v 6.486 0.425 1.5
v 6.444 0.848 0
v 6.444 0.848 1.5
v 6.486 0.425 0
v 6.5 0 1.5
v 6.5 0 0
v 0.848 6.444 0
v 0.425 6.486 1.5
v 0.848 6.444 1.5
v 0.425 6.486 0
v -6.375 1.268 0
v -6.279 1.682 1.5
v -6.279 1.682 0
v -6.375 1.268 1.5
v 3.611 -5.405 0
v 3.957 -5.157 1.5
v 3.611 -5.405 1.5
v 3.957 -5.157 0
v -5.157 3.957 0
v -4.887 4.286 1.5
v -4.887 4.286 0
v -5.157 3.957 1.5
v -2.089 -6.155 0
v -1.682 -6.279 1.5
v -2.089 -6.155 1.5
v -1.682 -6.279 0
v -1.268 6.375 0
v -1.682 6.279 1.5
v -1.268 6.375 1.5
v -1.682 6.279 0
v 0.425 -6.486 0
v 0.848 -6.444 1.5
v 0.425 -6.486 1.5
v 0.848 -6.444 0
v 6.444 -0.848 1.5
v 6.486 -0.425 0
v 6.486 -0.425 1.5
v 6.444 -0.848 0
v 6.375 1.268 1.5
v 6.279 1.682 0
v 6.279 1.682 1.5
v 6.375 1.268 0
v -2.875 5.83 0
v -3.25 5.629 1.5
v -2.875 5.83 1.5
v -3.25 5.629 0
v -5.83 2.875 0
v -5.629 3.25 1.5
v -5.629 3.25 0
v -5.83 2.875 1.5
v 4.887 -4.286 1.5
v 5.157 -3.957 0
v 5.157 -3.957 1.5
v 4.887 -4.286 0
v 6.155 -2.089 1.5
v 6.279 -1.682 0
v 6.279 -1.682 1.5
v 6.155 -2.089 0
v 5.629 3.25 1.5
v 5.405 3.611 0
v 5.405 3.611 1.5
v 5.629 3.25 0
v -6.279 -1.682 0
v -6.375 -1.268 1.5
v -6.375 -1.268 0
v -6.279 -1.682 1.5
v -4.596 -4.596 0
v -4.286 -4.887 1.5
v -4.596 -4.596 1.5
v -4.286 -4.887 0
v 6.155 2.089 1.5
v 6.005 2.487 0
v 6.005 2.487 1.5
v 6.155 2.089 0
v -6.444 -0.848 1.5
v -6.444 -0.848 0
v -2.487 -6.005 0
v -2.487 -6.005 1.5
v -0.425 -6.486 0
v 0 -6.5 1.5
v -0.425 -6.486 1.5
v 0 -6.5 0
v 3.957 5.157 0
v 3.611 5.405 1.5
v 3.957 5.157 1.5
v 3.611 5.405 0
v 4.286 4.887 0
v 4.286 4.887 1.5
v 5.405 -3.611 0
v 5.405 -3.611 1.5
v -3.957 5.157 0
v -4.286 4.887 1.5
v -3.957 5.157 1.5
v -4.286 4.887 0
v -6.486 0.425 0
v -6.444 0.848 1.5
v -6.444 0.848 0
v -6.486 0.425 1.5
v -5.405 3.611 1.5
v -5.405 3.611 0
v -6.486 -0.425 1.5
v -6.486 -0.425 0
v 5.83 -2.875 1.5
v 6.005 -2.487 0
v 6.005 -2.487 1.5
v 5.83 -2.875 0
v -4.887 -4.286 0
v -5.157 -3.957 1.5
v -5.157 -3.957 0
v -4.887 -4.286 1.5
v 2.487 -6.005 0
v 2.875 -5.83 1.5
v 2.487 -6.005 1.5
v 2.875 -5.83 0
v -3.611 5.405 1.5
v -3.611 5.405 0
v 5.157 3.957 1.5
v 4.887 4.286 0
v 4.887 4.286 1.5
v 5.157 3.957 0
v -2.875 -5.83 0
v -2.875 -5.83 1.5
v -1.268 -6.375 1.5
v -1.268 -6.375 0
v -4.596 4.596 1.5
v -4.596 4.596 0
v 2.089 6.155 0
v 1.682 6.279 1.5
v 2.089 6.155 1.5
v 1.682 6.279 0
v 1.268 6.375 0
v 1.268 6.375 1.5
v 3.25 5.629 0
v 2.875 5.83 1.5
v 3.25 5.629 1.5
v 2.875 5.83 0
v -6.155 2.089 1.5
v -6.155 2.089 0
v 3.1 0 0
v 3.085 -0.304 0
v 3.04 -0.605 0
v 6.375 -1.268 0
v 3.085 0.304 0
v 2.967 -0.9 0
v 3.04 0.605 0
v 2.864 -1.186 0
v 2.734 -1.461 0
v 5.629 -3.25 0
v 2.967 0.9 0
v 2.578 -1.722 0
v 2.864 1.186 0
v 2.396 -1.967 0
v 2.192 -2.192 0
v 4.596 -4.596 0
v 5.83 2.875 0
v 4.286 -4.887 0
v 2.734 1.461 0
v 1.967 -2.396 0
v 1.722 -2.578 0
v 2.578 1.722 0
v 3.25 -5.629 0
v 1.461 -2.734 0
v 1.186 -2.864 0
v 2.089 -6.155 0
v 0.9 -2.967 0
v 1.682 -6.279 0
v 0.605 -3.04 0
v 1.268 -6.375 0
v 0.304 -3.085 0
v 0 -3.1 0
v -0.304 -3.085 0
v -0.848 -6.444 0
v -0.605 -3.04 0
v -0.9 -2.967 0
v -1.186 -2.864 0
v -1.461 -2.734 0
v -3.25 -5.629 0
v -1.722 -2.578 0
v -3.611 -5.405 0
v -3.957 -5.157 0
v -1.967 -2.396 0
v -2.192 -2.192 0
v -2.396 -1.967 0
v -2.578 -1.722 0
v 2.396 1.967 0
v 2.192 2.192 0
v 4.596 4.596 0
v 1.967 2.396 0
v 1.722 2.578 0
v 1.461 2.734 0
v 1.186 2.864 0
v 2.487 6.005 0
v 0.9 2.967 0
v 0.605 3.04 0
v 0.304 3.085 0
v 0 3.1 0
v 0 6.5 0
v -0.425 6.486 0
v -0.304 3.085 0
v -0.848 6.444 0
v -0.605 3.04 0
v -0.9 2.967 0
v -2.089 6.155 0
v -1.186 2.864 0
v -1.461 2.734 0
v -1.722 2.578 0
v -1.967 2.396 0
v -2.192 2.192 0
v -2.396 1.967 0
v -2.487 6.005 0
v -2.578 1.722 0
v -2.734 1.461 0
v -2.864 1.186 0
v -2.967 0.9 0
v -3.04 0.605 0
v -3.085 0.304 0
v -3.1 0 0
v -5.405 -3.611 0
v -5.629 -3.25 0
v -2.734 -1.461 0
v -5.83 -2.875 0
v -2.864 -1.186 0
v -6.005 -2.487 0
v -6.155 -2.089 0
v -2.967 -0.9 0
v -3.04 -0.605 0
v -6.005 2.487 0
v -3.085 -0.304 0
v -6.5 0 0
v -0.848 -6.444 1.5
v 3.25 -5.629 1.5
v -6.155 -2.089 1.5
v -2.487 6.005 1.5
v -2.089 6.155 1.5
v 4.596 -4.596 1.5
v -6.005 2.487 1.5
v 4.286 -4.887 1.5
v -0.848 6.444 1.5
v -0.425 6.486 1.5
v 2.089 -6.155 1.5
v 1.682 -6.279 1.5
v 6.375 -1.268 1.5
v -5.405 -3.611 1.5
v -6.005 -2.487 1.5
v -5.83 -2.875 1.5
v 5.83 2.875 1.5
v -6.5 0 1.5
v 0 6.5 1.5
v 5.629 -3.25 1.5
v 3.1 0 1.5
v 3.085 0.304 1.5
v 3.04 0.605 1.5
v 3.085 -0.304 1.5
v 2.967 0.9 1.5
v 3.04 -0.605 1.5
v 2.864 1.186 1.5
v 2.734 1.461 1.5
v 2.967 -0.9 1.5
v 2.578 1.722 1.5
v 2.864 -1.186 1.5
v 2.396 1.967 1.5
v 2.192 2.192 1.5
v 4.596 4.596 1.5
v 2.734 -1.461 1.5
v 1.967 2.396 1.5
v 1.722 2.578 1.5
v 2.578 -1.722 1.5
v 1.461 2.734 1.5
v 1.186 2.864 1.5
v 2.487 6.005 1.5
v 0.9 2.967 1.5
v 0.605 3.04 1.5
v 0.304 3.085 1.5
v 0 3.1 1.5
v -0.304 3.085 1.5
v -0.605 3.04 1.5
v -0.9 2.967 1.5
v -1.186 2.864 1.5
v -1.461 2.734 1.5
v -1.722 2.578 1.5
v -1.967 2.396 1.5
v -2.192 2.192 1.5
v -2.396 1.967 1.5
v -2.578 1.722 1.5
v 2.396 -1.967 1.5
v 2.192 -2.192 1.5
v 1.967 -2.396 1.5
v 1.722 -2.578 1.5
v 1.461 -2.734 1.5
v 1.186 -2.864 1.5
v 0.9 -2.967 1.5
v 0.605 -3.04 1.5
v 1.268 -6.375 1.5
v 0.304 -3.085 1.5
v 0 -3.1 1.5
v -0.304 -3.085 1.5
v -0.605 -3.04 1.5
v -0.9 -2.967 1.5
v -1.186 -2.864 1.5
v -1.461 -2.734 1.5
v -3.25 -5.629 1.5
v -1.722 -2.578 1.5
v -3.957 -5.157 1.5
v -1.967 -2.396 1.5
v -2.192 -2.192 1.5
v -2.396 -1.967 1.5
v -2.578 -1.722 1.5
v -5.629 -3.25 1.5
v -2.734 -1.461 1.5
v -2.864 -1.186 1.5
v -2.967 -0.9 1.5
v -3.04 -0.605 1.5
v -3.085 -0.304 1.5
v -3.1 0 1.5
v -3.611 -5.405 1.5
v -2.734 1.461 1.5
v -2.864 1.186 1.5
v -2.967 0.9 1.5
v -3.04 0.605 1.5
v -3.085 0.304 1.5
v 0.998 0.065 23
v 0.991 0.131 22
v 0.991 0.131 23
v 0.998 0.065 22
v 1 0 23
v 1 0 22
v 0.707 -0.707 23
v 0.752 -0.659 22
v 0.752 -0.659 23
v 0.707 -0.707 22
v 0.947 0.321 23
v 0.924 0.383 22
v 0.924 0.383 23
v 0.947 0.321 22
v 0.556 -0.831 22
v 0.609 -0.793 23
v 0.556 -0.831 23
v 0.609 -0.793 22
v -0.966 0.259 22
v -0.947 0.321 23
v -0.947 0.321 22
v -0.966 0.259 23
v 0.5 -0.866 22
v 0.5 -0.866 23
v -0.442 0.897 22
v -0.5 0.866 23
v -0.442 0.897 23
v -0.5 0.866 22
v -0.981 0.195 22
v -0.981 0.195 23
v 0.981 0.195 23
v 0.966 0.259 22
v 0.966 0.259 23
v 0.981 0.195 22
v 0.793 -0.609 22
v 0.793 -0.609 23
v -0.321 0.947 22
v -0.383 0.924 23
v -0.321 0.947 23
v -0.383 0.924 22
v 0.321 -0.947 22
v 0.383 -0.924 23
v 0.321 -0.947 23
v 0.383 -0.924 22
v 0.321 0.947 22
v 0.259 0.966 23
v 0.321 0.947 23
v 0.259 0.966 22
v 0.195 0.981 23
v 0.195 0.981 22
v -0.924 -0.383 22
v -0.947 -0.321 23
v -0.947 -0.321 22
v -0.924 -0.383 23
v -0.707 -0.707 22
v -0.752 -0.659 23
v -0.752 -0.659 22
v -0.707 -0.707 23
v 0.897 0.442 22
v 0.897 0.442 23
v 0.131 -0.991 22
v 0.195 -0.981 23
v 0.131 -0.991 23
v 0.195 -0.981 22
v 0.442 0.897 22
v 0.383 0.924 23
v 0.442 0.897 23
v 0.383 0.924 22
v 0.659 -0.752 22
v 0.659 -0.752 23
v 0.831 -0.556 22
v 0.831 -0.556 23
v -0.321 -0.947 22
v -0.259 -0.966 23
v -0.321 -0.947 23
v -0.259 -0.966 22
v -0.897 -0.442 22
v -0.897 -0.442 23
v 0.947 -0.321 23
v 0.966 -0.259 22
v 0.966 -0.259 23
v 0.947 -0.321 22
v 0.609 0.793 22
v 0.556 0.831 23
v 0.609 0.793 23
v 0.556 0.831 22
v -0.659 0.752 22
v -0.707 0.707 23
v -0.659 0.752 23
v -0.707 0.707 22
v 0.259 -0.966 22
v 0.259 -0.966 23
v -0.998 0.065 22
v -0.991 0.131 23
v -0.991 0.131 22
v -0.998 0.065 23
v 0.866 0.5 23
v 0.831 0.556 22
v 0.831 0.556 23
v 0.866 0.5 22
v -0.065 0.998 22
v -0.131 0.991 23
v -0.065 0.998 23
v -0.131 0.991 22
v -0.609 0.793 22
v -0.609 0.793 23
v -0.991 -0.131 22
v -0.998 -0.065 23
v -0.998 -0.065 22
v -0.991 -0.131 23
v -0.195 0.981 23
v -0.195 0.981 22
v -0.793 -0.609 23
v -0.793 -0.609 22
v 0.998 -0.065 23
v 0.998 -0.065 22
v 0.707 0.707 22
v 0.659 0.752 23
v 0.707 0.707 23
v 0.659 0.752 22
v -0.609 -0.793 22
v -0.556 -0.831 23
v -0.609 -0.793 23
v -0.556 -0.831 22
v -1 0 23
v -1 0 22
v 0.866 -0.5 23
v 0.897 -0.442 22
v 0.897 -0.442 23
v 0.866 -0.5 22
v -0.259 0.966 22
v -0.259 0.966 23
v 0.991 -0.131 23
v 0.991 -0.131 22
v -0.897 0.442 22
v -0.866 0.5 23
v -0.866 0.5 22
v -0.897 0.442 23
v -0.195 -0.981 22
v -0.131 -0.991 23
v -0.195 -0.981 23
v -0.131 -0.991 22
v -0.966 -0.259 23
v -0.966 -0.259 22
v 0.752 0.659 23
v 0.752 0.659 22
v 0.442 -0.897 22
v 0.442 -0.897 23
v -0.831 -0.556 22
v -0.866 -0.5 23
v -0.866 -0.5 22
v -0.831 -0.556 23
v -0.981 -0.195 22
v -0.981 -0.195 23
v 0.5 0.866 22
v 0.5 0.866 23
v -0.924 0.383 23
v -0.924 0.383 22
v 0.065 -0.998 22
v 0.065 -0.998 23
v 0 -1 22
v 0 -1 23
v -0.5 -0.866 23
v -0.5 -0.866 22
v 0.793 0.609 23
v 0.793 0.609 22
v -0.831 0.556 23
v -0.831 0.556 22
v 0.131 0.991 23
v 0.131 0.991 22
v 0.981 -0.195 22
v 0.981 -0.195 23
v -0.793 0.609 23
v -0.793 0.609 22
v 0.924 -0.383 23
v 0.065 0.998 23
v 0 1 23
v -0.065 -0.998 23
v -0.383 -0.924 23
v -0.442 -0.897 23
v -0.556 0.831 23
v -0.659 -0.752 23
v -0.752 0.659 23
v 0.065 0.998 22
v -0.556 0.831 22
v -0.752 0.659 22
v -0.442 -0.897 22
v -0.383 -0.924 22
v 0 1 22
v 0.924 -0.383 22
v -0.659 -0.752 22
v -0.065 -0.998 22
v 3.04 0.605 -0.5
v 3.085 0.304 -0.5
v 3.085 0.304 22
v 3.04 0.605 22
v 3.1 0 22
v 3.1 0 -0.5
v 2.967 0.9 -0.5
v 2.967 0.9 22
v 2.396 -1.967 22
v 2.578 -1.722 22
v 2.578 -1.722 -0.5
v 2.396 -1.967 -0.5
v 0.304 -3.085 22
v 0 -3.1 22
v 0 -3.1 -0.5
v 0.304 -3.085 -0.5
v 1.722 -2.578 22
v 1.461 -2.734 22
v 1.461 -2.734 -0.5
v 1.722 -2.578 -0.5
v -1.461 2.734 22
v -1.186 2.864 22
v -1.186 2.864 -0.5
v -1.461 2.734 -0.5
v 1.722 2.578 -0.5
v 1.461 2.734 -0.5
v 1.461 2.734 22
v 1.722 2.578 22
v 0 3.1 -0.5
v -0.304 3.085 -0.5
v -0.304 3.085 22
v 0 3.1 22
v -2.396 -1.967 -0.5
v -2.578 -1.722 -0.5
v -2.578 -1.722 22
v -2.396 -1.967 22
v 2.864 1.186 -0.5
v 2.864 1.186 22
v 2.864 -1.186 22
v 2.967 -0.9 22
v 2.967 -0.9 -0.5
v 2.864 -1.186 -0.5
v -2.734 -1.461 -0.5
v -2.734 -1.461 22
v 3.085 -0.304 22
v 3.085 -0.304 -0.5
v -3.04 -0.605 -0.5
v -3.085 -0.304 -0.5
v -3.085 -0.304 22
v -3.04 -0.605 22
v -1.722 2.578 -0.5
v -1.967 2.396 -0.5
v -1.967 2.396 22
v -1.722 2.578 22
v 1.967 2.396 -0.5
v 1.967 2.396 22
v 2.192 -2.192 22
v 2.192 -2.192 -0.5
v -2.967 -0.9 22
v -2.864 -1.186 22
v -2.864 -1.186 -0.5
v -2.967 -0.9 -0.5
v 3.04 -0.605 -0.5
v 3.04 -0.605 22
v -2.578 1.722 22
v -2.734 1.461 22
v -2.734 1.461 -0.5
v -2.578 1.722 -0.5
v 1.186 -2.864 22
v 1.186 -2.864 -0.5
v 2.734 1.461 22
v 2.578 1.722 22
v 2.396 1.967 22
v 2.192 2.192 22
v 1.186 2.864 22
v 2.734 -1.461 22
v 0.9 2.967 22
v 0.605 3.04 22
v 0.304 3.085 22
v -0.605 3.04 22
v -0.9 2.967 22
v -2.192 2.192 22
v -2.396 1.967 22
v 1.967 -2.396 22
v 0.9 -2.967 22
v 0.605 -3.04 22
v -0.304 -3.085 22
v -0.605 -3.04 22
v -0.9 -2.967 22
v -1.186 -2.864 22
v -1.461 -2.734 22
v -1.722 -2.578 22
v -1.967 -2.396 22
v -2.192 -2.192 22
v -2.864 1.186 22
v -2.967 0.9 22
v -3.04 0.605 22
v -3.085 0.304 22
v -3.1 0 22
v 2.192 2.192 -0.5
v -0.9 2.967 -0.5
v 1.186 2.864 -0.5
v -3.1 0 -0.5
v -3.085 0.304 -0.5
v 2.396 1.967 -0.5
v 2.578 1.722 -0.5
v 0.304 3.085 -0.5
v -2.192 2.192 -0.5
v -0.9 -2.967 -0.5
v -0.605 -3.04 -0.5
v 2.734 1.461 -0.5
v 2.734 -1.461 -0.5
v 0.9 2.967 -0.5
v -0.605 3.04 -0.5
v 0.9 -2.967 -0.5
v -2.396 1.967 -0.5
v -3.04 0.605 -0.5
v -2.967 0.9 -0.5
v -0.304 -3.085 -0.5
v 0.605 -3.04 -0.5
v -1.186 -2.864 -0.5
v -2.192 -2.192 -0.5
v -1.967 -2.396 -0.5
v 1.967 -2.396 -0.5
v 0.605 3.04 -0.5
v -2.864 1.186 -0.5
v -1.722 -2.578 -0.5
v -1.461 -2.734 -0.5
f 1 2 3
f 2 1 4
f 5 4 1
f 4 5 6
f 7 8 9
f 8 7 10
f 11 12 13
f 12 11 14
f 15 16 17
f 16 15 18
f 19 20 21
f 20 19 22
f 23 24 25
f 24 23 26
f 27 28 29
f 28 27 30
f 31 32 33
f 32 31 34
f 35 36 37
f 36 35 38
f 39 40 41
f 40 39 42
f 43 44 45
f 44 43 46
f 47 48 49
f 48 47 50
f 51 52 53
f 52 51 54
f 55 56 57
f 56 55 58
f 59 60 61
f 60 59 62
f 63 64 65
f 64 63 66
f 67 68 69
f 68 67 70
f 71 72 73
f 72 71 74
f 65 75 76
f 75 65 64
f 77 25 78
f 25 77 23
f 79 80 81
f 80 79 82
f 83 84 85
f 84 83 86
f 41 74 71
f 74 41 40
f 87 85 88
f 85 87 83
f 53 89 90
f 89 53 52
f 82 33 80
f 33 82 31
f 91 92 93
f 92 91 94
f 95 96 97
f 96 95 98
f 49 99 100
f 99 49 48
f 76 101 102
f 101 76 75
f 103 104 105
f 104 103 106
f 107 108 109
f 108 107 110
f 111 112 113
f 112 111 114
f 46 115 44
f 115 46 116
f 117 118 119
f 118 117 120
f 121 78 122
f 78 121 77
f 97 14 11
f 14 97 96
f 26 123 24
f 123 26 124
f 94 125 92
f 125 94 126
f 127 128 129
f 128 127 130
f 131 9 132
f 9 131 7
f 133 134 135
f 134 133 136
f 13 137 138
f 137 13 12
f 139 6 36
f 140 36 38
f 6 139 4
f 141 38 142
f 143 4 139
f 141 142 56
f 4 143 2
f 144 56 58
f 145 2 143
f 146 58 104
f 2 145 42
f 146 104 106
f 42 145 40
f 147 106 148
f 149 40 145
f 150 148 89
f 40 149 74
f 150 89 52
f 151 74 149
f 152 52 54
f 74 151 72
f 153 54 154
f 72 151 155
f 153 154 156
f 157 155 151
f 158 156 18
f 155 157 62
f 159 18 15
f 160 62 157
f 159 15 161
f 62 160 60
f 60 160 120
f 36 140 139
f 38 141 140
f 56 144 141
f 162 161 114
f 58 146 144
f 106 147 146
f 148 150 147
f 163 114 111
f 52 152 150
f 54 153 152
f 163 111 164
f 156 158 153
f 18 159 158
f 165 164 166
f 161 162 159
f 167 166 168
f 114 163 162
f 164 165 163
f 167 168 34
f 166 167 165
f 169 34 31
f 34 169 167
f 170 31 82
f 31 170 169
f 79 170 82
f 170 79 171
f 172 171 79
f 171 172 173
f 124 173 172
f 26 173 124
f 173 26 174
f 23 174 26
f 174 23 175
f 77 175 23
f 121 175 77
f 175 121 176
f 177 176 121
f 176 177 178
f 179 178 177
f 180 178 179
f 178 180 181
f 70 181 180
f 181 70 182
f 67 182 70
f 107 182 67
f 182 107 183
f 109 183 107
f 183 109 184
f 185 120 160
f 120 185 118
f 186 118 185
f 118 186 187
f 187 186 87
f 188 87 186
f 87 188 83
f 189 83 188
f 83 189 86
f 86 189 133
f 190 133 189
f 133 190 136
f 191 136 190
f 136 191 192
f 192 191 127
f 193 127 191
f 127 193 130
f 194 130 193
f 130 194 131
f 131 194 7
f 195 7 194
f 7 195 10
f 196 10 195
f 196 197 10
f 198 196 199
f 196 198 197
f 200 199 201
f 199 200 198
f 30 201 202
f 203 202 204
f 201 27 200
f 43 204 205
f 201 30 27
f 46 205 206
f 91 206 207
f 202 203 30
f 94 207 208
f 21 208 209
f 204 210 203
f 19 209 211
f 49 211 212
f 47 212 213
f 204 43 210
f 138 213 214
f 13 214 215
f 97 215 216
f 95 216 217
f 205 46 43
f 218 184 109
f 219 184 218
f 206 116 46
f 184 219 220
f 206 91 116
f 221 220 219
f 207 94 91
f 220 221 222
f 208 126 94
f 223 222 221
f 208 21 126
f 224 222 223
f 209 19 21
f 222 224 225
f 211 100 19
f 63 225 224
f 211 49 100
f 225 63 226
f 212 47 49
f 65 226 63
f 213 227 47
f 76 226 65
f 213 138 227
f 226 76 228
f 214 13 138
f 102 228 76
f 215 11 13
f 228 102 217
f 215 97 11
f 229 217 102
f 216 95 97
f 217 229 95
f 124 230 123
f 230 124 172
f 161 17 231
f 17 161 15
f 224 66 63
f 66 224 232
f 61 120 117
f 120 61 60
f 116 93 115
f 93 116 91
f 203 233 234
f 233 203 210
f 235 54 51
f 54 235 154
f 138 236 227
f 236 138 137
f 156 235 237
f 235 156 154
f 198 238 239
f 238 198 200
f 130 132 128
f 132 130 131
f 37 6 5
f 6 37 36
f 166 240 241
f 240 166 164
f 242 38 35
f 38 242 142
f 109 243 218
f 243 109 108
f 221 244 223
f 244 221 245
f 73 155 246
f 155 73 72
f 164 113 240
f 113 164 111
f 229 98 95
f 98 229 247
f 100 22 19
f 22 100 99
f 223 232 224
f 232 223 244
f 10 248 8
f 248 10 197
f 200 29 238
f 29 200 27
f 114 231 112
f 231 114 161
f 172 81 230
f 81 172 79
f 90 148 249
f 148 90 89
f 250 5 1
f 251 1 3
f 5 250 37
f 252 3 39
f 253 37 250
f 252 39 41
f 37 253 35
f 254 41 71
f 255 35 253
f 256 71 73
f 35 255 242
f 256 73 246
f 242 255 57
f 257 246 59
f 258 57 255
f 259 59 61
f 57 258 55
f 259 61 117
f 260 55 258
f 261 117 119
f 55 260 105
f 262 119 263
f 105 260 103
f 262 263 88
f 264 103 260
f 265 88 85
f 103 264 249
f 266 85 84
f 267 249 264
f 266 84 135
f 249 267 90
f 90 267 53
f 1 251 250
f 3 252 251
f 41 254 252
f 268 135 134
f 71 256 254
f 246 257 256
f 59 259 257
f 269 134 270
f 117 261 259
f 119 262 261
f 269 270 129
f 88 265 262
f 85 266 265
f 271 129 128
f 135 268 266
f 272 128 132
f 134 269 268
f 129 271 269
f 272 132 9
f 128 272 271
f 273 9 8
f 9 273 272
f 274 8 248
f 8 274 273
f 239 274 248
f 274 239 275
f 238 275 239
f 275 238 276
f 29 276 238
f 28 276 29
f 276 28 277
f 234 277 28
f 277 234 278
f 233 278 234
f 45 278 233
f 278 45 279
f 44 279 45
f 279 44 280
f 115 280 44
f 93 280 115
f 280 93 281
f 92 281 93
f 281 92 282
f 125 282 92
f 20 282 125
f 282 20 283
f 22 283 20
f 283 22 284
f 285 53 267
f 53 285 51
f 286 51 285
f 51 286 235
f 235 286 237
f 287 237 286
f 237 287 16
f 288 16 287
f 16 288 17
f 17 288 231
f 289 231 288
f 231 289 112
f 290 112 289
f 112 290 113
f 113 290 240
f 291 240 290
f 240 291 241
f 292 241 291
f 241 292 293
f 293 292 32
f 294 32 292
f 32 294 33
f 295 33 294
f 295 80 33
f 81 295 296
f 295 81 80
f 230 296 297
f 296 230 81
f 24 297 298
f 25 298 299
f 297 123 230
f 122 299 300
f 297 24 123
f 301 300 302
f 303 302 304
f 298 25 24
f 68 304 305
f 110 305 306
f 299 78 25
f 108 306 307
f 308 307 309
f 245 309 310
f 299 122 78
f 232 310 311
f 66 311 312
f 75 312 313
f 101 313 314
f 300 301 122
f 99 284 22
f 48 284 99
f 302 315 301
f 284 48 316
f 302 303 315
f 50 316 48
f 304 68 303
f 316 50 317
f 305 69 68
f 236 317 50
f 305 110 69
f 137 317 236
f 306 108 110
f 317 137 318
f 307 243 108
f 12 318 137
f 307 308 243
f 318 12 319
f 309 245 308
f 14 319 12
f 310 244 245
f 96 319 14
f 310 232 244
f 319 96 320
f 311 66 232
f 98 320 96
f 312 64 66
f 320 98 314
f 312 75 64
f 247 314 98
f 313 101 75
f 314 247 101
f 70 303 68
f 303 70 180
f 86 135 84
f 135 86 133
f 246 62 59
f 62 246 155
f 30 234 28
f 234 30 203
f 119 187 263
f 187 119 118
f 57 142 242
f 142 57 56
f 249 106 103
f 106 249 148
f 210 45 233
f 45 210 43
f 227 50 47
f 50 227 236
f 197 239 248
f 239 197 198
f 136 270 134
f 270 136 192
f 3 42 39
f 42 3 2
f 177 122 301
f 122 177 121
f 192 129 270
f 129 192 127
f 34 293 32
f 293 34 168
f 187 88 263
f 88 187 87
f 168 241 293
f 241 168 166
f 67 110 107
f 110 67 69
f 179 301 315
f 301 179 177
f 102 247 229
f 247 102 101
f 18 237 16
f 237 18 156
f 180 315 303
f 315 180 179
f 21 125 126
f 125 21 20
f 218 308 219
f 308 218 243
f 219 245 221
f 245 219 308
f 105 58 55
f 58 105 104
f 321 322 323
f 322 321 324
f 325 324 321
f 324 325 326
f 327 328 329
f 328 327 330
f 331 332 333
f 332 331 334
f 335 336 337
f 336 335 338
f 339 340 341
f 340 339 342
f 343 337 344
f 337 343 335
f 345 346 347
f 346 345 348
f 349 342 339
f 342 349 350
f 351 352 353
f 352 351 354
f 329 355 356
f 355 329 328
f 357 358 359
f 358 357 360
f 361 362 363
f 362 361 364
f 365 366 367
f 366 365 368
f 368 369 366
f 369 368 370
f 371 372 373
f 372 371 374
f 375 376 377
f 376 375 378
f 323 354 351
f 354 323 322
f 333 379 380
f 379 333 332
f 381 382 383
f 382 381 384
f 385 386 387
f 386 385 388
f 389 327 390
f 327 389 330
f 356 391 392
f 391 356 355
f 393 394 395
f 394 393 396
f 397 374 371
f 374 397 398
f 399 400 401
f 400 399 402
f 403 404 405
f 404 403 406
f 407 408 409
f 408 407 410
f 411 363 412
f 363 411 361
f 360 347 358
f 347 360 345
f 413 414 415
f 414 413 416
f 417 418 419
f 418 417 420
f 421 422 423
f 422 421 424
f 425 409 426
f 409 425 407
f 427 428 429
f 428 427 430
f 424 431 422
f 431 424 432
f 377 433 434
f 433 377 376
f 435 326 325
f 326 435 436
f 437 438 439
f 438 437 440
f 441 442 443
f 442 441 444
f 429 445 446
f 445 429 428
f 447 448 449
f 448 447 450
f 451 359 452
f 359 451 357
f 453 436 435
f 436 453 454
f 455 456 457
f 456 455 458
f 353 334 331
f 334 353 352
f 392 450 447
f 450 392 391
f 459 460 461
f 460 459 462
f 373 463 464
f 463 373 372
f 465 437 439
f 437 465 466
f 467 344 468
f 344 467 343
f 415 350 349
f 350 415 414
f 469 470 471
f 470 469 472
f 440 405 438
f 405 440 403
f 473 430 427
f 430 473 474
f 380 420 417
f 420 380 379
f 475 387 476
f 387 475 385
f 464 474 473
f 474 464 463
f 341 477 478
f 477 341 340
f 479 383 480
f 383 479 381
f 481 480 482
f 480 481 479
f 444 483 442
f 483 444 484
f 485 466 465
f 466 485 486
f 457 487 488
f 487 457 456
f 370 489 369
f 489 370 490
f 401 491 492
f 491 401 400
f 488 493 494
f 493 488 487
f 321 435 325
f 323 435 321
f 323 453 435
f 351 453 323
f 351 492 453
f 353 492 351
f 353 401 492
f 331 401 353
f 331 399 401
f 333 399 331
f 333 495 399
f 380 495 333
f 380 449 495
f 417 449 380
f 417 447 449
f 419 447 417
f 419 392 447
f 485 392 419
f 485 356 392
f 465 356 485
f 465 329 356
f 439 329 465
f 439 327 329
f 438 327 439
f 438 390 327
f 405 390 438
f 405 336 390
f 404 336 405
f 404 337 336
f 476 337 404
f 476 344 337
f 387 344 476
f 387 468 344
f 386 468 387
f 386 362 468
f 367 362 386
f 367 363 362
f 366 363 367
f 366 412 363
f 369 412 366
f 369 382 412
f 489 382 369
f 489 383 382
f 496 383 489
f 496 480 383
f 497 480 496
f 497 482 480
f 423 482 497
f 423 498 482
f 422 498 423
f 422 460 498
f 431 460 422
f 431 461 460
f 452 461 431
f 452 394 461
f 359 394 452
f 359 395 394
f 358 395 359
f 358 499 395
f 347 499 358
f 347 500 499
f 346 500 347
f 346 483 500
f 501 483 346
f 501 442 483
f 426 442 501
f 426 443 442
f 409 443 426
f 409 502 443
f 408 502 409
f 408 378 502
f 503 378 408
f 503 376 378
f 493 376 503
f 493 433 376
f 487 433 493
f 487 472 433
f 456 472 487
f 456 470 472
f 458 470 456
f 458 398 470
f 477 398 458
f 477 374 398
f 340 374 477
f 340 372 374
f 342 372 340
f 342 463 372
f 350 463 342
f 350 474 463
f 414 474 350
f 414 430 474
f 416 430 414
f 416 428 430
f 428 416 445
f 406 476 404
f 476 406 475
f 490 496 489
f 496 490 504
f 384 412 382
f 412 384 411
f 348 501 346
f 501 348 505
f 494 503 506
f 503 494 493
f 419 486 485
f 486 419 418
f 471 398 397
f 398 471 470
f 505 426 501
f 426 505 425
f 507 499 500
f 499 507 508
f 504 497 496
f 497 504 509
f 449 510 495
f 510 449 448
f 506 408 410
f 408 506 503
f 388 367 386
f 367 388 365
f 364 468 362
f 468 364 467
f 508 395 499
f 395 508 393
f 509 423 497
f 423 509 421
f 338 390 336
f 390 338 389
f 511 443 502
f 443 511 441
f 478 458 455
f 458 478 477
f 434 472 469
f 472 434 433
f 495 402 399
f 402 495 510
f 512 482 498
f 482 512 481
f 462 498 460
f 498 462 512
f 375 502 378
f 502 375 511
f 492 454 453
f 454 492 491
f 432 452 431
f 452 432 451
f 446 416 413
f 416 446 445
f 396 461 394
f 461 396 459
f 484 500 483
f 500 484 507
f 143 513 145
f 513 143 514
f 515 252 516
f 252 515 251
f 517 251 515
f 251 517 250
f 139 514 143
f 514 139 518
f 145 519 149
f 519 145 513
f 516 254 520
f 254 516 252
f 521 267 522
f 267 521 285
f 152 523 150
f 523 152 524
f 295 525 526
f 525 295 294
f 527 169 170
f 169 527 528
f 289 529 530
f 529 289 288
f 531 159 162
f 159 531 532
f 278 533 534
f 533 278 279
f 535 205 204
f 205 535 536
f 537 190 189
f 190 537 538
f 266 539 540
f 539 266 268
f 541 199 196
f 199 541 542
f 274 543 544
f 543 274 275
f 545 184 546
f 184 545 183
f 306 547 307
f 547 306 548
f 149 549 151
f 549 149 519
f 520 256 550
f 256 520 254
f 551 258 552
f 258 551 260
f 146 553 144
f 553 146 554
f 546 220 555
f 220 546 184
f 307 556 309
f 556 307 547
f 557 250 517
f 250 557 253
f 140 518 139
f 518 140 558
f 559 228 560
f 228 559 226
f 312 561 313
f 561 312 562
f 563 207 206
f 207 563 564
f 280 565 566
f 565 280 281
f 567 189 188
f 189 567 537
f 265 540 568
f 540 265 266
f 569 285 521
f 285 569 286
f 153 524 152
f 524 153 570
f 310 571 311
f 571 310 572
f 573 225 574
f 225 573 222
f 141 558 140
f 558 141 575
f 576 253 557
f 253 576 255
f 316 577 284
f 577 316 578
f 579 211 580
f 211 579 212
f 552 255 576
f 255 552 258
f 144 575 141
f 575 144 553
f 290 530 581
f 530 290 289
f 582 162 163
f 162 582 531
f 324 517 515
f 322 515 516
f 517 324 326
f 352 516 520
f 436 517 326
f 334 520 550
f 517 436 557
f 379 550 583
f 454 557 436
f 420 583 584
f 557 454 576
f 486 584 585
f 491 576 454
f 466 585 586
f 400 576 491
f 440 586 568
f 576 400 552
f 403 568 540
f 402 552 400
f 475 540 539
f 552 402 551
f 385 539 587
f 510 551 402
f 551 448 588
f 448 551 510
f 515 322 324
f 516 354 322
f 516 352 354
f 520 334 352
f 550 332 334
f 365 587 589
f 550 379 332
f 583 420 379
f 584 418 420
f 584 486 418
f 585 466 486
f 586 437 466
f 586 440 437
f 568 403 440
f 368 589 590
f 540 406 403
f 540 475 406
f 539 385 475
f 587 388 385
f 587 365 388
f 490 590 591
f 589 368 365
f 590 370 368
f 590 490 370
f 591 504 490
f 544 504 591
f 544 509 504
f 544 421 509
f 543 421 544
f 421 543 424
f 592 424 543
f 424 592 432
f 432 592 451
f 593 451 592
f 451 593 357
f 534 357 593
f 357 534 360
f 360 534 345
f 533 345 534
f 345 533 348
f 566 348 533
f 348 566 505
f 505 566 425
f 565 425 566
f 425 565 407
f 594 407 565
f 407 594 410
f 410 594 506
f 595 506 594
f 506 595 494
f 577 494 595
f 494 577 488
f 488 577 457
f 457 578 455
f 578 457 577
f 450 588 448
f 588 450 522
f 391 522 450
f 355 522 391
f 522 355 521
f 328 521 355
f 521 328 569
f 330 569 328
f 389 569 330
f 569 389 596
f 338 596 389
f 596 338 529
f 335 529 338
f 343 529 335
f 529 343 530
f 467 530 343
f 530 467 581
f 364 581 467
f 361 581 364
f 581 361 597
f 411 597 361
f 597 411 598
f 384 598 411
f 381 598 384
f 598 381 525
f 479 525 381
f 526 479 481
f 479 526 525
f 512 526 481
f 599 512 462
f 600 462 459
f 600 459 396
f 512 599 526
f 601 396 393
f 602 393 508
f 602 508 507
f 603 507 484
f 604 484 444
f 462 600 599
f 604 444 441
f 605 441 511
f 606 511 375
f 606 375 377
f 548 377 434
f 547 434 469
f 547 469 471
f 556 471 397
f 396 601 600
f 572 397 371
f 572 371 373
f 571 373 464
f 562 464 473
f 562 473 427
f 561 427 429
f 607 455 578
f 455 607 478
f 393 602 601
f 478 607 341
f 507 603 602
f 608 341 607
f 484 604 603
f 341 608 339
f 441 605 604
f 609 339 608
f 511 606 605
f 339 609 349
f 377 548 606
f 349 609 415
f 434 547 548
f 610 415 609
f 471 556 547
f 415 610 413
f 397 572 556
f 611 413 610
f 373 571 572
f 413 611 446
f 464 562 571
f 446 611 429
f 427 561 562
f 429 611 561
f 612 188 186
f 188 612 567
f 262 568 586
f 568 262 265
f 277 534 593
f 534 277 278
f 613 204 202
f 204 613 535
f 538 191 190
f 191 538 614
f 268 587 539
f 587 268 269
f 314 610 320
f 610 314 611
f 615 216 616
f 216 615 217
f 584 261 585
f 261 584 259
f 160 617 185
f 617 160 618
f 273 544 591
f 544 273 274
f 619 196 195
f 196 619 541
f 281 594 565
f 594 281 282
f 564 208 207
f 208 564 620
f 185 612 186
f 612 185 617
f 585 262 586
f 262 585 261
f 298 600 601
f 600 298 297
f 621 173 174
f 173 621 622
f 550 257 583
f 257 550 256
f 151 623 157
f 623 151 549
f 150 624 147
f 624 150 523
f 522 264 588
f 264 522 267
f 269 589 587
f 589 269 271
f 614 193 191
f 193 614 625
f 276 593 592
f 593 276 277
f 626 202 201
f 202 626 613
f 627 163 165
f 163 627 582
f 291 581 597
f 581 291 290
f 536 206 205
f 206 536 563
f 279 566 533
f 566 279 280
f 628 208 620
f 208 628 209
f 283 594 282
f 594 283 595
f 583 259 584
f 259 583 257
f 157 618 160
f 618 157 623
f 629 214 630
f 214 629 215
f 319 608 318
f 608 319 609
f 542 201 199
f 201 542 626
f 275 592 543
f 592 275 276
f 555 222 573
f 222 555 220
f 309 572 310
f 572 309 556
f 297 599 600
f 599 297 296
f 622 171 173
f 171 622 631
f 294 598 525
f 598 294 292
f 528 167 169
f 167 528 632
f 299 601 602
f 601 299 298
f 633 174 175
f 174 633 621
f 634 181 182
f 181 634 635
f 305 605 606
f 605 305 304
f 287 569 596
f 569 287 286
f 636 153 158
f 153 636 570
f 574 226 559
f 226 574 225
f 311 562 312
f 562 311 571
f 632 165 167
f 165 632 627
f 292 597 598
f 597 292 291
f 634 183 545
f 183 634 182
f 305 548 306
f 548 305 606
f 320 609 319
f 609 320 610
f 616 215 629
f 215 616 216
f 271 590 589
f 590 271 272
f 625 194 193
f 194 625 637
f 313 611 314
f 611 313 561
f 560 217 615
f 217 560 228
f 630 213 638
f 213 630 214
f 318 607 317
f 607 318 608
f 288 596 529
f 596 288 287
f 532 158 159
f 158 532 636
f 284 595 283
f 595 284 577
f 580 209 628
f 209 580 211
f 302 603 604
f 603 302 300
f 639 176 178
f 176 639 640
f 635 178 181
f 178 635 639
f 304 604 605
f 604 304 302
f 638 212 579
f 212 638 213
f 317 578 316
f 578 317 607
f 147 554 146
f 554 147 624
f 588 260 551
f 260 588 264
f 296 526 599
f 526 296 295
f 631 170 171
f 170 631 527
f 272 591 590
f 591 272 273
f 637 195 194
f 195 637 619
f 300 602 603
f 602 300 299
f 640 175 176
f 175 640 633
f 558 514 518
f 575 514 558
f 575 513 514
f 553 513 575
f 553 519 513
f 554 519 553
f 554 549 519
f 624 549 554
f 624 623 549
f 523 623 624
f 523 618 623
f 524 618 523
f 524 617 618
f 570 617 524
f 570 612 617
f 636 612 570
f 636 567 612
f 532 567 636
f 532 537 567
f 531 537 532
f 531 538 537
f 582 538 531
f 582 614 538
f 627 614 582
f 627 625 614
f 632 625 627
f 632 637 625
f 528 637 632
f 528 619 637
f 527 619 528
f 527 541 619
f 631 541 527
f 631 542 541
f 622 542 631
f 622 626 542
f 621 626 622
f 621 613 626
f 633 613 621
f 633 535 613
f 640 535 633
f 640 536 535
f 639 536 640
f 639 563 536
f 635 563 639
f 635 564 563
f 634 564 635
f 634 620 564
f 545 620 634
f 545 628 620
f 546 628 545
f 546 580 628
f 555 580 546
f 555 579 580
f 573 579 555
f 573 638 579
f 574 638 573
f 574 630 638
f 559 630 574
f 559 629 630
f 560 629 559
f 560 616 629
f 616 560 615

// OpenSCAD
// PCR tube adapter sleeve: sits in a 1.5 mL rack hole and cradles a 0.2 mL tube
// Print orientation: collar on the bed (z = 0), sleeve body builds upward (+Z)

// ---------------- Parameters ----------------
collar_d        = 13;    // collar outer diameter (keeps the 1.5 mL hole)
collar_t        = 1.5;   // collar thickness (z = 0 to 1.5)
sleeve_od       = 10.8;  // sleeve body outer diameter
sleeve_h        = 21.5;  // sleeve body height above the collar (z = 1.5 to 23.0)
bore_d          = 6.2;   // straight through-bore diameter (0.2 mL tube clearance)
eps             = 0.5;   // cutter overshoot past faces

$fn = 96;

// ---------------- Model ----------------
union() {
    // Collar: disc from z = 0 to 1.5
    cylinder(d = collar_d, h = collar_t);

    // Sleeve body: tube from z = 1.5 to 23.0 (10.8 mm OD, 6.2 mm bore)
    translate([0, 0, collar_t])
        cylinder(od = sleeve_od, h = sleeve_h, $fn = 96);
}

// Through-bore: open at both ends, extends eps above and below the part
translate([0, 0, -eps])
    cylinder(d = bore_d, h = sleeve_h + 2 * eps, $fn = 64);
